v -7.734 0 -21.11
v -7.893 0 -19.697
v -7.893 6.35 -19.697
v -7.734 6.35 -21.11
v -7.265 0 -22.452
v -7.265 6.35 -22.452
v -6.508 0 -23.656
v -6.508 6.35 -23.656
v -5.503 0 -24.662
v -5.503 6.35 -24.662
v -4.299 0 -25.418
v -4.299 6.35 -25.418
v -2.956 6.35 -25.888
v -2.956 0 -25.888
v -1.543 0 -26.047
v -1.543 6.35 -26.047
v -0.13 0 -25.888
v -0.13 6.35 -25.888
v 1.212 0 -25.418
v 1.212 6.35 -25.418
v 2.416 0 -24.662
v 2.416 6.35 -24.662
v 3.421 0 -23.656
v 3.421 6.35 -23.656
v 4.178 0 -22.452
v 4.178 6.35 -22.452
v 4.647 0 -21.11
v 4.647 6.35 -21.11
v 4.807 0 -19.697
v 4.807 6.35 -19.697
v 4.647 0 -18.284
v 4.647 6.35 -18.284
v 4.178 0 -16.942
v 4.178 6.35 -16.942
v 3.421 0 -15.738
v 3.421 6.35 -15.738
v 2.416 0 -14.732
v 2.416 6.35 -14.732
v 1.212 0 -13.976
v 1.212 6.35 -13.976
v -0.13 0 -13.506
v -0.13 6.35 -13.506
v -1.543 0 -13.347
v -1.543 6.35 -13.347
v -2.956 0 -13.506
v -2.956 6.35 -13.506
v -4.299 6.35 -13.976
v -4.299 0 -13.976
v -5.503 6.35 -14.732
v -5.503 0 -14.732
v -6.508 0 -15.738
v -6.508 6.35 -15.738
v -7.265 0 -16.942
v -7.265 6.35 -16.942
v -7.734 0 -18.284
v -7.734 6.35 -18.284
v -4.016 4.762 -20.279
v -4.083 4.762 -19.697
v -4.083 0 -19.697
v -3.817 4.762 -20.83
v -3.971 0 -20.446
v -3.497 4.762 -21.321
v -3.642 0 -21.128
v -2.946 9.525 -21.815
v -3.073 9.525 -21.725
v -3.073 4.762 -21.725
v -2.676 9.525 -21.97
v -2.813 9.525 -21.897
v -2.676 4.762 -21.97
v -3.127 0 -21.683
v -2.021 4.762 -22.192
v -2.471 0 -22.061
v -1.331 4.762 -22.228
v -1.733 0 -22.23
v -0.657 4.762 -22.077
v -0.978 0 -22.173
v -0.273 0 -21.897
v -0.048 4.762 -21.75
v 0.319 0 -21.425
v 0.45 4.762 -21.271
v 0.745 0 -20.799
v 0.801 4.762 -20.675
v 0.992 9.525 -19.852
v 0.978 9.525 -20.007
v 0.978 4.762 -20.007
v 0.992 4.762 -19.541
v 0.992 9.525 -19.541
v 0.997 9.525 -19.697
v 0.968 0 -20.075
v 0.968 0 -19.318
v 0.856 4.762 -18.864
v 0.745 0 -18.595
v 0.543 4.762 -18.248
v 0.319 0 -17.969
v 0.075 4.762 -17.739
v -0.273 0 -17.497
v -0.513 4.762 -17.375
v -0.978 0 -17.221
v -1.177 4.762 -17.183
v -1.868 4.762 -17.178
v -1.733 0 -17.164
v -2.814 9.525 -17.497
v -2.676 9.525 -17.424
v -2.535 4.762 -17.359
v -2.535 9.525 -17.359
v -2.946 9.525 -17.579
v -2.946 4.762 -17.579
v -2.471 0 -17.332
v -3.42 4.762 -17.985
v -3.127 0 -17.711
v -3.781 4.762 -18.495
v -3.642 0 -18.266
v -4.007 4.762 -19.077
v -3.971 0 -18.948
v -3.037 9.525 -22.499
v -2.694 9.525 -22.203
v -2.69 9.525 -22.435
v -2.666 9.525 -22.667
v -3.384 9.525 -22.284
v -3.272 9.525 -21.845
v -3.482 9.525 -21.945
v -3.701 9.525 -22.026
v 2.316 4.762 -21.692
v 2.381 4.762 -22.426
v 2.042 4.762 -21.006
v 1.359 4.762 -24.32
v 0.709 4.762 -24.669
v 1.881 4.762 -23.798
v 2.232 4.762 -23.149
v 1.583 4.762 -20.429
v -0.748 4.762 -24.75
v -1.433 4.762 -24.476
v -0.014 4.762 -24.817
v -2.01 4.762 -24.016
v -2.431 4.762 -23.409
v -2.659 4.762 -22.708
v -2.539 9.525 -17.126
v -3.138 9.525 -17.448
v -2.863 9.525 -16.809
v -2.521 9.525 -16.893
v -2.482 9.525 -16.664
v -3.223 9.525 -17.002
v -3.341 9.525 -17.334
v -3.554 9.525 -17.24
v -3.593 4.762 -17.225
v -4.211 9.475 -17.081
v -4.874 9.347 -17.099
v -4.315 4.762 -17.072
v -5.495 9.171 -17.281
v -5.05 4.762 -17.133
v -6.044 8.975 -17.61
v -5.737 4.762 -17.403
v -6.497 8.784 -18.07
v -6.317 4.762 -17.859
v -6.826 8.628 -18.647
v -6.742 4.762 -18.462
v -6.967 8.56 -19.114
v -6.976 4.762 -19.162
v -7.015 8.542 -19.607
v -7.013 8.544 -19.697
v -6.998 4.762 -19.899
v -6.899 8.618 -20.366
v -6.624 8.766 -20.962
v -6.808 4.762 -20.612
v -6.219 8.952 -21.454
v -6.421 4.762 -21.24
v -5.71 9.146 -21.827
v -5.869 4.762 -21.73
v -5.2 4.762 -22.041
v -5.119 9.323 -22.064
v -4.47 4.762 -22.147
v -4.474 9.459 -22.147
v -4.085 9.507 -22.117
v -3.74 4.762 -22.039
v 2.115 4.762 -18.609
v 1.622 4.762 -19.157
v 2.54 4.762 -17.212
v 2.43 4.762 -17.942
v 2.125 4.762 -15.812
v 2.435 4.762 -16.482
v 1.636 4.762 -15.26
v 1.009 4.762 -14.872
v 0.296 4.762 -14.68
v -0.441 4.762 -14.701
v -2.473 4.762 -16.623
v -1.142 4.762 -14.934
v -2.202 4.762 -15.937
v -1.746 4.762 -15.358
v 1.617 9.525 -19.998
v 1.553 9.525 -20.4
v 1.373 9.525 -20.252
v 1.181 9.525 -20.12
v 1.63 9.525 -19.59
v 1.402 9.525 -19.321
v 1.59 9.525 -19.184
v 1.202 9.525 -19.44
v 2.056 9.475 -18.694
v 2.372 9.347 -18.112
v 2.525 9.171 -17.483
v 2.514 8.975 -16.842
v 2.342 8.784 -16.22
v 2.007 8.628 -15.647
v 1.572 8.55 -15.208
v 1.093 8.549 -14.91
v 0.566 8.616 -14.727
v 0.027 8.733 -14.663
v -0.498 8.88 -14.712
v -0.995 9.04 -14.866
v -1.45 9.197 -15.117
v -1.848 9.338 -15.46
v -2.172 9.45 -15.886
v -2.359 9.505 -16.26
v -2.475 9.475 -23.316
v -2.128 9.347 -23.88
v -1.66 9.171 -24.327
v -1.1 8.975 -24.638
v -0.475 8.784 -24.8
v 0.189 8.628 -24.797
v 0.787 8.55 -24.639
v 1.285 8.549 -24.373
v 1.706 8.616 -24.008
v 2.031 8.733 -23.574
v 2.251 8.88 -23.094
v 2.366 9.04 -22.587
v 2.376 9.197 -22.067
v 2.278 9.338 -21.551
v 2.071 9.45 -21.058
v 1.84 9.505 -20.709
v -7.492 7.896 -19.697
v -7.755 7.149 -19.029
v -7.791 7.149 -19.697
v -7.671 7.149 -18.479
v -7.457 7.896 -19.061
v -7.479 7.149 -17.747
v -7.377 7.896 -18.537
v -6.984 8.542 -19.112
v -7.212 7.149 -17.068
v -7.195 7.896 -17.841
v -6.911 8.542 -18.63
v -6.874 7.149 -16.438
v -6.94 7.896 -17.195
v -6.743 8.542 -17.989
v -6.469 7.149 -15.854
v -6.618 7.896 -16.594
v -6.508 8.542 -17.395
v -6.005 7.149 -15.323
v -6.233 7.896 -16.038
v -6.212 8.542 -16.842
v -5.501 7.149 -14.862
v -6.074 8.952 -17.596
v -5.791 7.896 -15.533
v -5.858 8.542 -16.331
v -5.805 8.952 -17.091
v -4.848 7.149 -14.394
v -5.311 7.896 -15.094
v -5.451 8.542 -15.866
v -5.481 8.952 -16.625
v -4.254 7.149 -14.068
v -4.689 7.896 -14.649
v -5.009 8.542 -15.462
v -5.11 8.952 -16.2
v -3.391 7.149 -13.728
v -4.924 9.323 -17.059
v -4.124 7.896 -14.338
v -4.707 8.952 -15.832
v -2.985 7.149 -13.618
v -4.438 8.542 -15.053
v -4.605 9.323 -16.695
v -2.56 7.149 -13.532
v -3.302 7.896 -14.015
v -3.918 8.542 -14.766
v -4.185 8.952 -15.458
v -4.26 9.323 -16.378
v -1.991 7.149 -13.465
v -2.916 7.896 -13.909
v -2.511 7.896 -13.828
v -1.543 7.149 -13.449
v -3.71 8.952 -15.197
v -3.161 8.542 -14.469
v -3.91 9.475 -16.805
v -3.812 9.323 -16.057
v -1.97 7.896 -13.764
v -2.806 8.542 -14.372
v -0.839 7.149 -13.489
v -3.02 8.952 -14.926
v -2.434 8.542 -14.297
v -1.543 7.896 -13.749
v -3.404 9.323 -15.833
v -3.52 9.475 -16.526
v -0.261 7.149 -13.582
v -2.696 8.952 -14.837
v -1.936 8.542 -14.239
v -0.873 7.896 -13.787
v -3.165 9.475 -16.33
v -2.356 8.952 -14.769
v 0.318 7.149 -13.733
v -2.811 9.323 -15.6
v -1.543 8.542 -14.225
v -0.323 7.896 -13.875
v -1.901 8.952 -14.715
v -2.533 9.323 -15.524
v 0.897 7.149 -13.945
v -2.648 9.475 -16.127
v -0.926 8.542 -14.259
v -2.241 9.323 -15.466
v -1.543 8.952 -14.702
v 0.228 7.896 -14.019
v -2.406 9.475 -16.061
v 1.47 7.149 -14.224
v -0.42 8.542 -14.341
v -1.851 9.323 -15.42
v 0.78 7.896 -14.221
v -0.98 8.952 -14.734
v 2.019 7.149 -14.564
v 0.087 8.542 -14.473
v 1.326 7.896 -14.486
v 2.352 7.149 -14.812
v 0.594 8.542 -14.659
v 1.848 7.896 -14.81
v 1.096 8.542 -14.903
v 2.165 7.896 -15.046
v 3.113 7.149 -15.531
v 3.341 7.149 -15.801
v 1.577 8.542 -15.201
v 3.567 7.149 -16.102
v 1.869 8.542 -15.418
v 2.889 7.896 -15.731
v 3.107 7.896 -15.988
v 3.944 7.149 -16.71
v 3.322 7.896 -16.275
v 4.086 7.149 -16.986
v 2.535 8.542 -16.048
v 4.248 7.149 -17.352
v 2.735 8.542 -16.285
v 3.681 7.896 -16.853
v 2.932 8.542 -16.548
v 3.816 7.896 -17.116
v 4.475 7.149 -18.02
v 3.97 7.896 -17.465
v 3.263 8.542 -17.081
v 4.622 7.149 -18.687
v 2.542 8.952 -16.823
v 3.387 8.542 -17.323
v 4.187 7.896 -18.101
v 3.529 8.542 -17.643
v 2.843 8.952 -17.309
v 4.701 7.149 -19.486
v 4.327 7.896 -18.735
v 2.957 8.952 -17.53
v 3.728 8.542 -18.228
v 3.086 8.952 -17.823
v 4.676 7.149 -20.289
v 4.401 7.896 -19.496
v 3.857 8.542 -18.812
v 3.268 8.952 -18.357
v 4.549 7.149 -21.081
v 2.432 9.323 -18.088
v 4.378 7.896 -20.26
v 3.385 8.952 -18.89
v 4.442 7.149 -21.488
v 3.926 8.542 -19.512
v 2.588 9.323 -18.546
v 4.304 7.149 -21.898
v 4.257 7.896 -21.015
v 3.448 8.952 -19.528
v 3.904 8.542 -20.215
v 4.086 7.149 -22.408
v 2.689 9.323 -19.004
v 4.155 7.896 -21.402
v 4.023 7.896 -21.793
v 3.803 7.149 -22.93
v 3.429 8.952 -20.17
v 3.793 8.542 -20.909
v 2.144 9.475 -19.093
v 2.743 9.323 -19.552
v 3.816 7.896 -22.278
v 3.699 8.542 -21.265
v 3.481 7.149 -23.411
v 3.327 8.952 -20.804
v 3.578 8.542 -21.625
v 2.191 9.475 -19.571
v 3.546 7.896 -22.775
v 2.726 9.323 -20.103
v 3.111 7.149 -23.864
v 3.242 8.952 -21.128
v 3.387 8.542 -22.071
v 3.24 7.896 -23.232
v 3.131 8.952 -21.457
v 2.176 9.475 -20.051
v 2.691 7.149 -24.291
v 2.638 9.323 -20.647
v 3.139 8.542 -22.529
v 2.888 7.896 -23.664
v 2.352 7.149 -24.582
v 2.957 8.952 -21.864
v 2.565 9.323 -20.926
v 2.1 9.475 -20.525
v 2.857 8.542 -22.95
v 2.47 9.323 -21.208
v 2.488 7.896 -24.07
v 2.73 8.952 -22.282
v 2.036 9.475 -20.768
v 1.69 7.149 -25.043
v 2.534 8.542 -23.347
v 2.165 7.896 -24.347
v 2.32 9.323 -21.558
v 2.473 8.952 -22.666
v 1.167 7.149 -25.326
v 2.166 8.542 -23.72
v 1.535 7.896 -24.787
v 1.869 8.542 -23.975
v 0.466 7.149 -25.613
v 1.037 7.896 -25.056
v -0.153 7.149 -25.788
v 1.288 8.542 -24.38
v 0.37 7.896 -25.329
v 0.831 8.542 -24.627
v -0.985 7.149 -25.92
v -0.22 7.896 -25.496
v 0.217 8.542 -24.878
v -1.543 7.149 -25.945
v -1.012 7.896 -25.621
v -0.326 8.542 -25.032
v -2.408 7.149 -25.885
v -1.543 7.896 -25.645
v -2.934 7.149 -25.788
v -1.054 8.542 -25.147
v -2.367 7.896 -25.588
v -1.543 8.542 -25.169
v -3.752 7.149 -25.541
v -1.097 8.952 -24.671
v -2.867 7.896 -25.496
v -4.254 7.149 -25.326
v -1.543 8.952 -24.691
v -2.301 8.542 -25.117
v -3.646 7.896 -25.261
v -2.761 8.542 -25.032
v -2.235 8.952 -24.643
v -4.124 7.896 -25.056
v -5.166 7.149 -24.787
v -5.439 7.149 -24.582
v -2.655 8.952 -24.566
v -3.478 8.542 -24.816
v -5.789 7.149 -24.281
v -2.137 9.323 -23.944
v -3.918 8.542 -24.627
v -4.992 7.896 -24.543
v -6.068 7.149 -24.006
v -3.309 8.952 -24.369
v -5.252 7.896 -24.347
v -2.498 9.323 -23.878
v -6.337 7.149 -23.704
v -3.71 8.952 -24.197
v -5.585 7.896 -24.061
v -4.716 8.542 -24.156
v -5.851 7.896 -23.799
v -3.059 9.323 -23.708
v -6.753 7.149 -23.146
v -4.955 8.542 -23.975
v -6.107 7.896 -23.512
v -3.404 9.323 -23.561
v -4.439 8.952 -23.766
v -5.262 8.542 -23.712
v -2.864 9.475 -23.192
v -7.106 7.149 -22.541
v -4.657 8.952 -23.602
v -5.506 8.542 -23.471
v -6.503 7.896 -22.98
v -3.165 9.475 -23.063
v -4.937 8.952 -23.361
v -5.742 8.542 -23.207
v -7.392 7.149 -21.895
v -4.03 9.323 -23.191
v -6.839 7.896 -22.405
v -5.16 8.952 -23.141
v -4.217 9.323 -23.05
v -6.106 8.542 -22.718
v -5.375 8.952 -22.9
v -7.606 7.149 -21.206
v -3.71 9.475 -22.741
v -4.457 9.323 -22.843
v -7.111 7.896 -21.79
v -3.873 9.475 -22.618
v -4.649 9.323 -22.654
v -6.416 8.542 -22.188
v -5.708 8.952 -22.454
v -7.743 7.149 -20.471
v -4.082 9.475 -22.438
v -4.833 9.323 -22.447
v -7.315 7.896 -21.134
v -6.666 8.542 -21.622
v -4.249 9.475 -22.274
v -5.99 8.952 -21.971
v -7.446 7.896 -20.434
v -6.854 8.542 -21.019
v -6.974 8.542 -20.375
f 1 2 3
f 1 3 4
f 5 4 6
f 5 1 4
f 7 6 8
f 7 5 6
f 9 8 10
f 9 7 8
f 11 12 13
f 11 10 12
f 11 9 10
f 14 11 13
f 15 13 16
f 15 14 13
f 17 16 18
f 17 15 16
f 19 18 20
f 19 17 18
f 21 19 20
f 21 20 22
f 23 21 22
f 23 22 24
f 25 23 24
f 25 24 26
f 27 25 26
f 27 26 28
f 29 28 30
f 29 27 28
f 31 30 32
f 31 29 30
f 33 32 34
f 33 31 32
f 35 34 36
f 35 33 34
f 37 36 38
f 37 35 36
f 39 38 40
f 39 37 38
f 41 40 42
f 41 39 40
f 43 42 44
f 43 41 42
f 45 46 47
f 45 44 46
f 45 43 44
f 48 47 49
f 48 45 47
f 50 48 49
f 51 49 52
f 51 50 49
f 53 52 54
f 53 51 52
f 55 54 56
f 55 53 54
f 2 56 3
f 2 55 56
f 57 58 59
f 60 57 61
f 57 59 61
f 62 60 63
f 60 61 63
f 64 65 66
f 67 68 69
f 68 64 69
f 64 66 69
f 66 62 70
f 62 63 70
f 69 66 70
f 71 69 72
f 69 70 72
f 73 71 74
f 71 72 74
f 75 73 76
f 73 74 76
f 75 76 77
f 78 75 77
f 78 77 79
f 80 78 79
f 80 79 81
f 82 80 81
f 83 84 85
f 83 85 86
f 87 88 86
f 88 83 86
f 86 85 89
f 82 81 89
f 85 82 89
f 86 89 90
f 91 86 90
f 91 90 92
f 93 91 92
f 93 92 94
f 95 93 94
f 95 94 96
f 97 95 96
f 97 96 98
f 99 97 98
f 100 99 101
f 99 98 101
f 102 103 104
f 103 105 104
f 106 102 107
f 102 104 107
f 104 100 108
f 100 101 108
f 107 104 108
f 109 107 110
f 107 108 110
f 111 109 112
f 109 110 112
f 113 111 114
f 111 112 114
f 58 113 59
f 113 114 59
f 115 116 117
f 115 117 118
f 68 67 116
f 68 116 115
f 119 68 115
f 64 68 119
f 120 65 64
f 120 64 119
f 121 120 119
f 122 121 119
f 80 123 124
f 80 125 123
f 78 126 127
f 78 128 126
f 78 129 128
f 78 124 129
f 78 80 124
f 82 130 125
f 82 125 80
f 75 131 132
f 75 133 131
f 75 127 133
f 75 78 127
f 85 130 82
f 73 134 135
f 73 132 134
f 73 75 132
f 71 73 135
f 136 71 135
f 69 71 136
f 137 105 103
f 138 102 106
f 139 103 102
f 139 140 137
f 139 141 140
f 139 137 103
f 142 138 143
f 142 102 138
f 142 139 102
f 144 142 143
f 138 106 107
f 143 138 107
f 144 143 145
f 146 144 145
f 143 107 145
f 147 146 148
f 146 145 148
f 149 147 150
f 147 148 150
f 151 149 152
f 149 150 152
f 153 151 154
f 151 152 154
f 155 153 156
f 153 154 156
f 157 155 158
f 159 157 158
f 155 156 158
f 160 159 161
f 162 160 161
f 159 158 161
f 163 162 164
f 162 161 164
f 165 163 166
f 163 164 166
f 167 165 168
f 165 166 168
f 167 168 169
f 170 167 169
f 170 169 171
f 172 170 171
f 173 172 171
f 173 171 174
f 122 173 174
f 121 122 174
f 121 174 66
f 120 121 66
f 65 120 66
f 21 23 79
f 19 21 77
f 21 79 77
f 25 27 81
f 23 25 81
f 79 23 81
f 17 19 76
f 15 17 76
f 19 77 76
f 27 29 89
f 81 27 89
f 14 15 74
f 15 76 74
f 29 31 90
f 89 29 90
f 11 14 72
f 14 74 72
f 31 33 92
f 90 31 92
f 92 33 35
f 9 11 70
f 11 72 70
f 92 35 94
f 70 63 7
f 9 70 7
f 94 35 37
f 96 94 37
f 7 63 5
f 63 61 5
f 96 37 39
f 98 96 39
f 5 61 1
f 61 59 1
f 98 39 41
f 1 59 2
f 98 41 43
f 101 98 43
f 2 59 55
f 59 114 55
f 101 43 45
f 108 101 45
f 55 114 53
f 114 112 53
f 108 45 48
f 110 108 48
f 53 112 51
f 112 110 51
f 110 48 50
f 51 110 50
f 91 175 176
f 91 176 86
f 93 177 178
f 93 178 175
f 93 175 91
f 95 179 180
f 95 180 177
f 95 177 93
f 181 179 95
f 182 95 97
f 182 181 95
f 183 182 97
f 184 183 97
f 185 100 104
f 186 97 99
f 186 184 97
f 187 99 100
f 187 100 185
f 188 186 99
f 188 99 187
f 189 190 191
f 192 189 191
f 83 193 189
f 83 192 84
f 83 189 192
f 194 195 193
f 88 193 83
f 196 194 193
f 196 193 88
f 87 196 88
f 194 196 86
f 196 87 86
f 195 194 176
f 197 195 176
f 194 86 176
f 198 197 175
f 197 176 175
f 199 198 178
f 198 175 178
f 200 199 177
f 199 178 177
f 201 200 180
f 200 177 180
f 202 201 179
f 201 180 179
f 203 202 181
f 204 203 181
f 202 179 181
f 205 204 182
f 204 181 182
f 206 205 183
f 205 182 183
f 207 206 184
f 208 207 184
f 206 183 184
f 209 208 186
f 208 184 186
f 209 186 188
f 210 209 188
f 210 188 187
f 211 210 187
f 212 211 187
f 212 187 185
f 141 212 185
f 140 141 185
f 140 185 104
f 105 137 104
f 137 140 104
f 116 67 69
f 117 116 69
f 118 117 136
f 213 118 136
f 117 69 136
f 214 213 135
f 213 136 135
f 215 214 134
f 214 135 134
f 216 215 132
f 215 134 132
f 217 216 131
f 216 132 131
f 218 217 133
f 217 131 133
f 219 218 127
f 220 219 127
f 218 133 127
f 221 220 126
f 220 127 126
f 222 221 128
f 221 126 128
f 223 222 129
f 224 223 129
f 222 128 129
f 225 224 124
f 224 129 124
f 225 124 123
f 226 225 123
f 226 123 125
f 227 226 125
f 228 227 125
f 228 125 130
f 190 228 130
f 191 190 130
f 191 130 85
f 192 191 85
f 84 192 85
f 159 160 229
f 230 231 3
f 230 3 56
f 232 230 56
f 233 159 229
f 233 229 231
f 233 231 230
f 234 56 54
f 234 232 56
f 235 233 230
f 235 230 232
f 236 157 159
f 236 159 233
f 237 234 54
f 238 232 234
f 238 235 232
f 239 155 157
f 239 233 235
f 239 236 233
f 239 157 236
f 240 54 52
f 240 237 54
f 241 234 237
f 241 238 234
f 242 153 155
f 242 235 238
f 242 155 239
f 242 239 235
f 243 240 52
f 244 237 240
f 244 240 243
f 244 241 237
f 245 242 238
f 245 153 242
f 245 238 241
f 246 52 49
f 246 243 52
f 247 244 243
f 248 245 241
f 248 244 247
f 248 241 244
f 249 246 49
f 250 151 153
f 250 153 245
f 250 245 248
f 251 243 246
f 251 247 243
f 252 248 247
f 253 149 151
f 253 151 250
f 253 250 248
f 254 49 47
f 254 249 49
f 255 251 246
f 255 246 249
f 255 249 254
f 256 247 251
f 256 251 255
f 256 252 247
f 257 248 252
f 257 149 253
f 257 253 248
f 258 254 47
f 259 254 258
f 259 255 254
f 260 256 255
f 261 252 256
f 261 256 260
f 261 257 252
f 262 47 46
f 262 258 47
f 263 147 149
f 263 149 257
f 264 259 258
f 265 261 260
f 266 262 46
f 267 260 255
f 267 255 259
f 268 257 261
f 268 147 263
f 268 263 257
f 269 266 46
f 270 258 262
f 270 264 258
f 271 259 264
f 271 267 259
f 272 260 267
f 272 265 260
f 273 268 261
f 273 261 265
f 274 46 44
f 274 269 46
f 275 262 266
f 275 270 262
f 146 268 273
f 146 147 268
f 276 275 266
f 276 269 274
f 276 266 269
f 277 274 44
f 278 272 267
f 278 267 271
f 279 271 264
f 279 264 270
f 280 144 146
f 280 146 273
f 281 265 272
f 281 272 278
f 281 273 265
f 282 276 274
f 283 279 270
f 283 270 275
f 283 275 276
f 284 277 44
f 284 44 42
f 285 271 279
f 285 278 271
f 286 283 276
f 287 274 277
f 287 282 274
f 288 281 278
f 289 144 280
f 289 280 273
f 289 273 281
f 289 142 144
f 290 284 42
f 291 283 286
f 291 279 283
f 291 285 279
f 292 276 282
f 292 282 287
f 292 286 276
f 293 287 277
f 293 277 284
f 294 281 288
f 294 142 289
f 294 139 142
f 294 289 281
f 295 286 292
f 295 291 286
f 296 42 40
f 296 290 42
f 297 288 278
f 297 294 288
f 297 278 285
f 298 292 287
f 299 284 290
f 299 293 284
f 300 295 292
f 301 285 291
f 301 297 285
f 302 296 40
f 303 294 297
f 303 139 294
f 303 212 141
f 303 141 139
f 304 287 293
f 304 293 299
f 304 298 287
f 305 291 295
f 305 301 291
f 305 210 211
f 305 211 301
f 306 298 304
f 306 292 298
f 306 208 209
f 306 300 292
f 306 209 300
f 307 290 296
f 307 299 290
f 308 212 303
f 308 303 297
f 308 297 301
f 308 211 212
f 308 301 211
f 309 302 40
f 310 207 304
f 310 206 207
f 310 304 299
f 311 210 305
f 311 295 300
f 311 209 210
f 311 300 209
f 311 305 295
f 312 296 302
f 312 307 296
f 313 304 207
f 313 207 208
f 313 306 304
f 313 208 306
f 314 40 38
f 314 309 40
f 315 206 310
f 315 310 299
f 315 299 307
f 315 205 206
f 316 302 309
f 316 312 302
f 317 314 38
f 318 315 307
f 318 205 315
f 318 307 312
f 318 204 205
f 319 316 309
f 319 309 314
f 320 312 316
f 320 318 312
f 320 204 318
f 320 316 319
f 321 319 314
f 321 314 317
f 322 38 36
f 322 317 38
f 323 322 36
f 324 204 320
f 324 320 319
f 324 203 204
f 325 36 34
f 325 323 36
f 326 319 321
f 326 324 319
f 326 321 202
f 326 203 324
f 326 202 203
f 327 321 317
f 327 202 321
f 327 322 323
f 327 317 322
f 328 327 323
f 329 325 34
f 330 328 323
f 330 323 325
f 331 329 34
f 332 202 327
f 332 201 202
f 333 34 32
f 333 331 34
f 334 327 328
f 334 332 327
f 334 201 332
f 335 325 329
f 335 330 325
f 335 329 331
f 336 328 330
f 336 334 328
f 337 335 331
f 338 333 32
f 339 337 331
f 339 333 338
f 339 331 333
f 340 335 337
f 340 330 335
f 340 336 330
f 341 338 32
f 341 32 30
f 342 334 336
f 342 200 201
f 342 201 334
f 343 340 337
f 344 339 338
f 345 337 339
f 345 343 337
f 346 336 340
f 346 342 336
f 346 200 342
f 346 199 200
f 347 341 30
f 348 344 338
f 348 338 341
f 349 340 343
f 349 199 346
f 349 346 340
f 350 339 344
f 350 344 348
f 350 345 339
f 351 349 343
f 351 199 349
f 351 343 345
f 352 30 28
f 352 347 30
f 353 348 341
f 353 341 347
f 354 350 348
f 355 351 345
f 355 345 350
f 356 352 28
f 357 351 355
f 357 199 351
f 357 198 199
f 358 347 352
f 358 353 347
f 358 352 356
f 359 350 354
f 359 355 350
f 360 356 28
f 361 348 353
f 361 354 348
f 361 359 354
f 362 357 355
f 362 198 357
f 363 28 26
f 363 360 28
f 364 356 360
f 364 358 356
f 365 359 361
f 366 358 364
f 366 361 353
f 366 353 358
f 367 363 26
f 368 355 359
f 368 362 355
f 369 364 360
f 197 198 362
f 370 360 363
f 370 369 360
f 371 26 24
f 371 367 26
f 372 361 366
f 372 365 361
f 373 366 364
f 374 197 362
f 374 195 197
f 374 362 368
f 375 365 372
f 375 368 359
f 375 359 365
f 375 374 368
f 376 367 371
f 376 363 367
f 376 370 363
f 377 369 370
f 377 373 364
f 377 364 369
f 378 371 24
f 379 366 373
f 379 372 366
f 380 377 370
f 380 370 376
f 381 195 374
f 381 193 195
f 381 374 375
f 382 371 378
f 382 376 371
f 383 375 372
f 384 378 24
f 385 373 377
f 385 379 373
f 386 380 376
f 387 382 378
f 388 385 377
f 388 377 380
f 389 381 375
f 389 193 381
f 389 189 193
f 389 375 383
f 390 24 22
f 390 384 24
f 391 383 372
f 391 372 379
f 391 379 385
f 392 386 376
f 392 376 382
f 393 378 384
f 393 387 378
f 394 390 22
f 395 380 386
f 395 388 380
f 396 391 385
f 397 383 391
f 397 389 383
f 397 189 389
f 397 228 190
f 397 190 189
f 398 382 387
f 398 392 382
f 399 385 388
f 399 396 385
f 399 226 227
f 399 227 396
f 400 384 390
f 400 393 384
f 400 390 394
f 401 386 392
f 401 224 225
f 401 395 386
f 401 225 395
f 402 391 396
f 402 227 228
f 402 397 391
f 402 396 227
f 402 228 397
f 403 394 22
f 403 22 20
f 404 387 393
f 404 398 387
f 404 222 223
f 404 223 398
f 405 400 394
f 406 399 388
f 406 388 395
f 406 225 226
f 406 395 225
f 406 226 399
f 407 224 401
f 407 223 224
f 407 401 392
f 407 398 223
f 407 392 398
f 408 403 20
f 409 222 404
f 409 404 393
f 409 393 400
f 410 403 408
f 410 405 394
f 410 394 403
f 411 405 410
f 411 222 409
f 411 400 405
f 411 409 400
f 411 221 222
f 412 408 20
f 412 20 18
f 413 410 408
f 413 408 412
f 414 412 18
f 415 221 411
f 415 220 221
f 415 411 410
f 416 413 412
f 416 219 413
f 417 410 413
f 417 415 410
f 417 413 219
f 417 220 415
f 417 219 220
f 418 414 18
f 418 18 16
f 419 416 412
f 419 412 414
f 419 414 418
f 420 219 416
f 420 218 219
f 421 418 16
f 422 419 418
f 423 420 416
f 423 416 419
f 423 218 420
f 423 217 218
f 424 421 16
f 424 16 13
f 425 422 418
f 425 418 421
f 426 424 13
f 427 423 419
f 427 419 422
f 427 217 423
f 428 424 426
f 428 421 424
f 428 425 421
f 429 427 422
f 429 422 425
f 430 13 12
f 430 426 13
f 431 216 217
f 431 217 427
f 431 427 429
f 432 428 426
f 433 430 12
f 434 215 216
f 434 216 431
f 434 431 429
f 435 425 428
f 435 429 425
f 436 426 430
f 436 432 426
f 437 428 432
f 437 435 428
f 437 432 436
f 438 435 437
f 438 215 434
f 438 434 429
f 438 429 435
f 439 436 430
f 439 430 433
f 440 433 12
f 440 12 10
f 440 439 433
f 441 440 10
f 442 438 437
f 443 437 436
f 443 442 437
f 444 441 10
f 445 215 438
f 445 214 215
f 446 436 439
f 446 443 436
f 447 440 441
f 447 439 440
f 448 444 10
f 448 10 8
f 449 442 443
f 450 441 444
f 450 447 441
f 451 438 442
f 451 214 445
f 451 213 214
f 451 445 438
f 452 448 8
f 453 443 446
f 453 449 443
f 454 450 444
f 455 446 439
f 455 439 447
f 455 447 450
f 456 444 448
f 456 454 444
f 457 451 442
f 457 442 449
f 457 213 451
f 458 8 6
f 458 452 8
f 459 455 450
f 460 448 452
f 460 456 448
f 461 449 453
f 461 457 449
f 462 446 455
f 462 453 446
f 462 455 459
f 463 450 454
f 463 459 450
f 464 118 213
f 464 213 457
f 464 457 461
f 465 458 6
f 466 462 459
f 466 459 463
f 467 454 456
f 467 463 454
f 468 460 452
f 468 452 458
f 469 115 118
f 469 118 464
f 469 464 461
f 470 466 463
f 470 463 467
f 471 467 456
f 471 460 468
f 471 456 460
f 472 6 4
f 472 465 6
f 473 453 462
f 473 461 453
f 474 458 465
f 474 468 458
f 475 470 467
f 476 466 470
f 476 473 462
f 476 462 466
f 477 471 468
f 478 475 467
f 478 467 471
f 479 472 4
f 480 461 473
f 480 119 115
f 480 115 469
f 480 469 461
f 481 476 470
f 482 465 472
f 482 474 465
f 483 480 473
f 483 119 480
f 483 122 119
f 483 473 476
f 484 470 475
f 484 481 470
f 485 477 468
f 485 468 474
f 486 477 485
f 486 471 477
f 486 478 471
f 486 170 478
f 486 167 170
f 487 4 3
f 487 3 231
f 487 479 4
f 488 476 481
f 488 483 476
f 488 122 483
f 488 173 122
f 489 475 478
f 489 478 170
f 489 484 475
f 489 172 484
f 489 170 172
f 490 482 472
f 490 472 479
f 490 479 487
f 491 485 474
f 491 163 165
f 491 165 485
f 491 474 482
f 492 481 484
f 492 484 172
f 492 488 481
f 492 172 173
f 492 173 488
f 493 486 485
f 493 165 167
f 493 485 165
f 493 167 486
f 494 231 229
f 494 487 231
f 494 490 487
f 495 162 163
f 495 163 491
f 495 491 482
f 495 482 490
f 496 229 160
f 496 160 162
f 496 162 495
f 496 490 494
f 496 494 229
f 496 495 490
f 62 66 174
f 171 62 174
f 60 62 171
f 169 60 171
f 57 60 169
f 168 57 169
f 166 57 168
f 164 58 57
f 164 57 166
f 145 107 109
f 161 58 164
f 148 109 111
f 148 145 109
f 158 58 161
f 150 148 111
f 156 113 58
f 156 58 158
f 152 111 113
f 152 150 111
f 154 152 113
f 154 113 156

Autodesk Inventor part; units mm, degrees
ref_plane "YZ Plane" through (0, 0, 0) normal (1, 0, 0) x (0, 1, 0)
ref_plane "XZ Plane" through (0, 0, 0) normal (0, 1, 0) x (-1, 0, 0)
ref_plane "XY Plane" through (0, 0, 0) normal (0, 0, 1) x (1, 0, 0)
sketch "Sketch1" plane through (0, 0, 0) normal (0, 1, 0) x (-1, 0, 0)
  circle A0 centre (0, -17.2028) radius 2.54
  circle A1 centre (0.1552, -22.2805) radius 2.54
  line L0 (0, -17.2028) -> (4.826, -17.2028) construction
  circle A2 centre (4.475, -19.6072) radius 2.54
  circle A3 centre (1.5434, -19.6969) radius 2.54
  circle A4 centre (1.5434, -19.6969) radius 6.35
  line L1 (0.1552, -22.2805) -> (0, -17.2028)
  line L2 (4.475, -19.6072) -> (0, -17.2028)
  line L3 (4.475, -19.6072) -> (0.1552, -22.2805)
  line L4 (2.3151, -20.9439) -> (0, -17.2028)
  line L5 (0.1552, -22.2805) -> (2.2375, -18.405)
  line L6 (0.0776, -19.7417) -> (4.475, -19.6072)
  point P0 (3.0726, -21.725)
  point P1 (2.6762, -21.9703)
  point P2 (-0.9776, -20.0071)
  point P3 (-0.9918, -19.5412)
  point P4 (2.5352, -17.3585)
  point P5 (2.9458, -17.5791)
  dimension "d3" = 5.08
  dimension "d7" = 5.08
  dimension "d8" = 12.7
  dimension "d14" = 5.08
  dimension "d15" = 5.08
extrude "Extrusion1" add sketch "Sketch1" along normal blind 4.7625 contours A0 A3 L2 L1 | L1 L4 A3 | A3 L1 L3 A1 | A2 A3 L3 L2 | A3 L4 L2 | A3 L5 L1 | L2 L6 A3 | A3 L3 L5 | L6 L3 A3 | A4
extrude "Extrusion2" add sketch "Sketch1" along normal blind 9.525
fillet "Fillet1" radius 3.175 1 edges at (4.8066, 9.525, -19.6969)
properties part number "PluckTool"
